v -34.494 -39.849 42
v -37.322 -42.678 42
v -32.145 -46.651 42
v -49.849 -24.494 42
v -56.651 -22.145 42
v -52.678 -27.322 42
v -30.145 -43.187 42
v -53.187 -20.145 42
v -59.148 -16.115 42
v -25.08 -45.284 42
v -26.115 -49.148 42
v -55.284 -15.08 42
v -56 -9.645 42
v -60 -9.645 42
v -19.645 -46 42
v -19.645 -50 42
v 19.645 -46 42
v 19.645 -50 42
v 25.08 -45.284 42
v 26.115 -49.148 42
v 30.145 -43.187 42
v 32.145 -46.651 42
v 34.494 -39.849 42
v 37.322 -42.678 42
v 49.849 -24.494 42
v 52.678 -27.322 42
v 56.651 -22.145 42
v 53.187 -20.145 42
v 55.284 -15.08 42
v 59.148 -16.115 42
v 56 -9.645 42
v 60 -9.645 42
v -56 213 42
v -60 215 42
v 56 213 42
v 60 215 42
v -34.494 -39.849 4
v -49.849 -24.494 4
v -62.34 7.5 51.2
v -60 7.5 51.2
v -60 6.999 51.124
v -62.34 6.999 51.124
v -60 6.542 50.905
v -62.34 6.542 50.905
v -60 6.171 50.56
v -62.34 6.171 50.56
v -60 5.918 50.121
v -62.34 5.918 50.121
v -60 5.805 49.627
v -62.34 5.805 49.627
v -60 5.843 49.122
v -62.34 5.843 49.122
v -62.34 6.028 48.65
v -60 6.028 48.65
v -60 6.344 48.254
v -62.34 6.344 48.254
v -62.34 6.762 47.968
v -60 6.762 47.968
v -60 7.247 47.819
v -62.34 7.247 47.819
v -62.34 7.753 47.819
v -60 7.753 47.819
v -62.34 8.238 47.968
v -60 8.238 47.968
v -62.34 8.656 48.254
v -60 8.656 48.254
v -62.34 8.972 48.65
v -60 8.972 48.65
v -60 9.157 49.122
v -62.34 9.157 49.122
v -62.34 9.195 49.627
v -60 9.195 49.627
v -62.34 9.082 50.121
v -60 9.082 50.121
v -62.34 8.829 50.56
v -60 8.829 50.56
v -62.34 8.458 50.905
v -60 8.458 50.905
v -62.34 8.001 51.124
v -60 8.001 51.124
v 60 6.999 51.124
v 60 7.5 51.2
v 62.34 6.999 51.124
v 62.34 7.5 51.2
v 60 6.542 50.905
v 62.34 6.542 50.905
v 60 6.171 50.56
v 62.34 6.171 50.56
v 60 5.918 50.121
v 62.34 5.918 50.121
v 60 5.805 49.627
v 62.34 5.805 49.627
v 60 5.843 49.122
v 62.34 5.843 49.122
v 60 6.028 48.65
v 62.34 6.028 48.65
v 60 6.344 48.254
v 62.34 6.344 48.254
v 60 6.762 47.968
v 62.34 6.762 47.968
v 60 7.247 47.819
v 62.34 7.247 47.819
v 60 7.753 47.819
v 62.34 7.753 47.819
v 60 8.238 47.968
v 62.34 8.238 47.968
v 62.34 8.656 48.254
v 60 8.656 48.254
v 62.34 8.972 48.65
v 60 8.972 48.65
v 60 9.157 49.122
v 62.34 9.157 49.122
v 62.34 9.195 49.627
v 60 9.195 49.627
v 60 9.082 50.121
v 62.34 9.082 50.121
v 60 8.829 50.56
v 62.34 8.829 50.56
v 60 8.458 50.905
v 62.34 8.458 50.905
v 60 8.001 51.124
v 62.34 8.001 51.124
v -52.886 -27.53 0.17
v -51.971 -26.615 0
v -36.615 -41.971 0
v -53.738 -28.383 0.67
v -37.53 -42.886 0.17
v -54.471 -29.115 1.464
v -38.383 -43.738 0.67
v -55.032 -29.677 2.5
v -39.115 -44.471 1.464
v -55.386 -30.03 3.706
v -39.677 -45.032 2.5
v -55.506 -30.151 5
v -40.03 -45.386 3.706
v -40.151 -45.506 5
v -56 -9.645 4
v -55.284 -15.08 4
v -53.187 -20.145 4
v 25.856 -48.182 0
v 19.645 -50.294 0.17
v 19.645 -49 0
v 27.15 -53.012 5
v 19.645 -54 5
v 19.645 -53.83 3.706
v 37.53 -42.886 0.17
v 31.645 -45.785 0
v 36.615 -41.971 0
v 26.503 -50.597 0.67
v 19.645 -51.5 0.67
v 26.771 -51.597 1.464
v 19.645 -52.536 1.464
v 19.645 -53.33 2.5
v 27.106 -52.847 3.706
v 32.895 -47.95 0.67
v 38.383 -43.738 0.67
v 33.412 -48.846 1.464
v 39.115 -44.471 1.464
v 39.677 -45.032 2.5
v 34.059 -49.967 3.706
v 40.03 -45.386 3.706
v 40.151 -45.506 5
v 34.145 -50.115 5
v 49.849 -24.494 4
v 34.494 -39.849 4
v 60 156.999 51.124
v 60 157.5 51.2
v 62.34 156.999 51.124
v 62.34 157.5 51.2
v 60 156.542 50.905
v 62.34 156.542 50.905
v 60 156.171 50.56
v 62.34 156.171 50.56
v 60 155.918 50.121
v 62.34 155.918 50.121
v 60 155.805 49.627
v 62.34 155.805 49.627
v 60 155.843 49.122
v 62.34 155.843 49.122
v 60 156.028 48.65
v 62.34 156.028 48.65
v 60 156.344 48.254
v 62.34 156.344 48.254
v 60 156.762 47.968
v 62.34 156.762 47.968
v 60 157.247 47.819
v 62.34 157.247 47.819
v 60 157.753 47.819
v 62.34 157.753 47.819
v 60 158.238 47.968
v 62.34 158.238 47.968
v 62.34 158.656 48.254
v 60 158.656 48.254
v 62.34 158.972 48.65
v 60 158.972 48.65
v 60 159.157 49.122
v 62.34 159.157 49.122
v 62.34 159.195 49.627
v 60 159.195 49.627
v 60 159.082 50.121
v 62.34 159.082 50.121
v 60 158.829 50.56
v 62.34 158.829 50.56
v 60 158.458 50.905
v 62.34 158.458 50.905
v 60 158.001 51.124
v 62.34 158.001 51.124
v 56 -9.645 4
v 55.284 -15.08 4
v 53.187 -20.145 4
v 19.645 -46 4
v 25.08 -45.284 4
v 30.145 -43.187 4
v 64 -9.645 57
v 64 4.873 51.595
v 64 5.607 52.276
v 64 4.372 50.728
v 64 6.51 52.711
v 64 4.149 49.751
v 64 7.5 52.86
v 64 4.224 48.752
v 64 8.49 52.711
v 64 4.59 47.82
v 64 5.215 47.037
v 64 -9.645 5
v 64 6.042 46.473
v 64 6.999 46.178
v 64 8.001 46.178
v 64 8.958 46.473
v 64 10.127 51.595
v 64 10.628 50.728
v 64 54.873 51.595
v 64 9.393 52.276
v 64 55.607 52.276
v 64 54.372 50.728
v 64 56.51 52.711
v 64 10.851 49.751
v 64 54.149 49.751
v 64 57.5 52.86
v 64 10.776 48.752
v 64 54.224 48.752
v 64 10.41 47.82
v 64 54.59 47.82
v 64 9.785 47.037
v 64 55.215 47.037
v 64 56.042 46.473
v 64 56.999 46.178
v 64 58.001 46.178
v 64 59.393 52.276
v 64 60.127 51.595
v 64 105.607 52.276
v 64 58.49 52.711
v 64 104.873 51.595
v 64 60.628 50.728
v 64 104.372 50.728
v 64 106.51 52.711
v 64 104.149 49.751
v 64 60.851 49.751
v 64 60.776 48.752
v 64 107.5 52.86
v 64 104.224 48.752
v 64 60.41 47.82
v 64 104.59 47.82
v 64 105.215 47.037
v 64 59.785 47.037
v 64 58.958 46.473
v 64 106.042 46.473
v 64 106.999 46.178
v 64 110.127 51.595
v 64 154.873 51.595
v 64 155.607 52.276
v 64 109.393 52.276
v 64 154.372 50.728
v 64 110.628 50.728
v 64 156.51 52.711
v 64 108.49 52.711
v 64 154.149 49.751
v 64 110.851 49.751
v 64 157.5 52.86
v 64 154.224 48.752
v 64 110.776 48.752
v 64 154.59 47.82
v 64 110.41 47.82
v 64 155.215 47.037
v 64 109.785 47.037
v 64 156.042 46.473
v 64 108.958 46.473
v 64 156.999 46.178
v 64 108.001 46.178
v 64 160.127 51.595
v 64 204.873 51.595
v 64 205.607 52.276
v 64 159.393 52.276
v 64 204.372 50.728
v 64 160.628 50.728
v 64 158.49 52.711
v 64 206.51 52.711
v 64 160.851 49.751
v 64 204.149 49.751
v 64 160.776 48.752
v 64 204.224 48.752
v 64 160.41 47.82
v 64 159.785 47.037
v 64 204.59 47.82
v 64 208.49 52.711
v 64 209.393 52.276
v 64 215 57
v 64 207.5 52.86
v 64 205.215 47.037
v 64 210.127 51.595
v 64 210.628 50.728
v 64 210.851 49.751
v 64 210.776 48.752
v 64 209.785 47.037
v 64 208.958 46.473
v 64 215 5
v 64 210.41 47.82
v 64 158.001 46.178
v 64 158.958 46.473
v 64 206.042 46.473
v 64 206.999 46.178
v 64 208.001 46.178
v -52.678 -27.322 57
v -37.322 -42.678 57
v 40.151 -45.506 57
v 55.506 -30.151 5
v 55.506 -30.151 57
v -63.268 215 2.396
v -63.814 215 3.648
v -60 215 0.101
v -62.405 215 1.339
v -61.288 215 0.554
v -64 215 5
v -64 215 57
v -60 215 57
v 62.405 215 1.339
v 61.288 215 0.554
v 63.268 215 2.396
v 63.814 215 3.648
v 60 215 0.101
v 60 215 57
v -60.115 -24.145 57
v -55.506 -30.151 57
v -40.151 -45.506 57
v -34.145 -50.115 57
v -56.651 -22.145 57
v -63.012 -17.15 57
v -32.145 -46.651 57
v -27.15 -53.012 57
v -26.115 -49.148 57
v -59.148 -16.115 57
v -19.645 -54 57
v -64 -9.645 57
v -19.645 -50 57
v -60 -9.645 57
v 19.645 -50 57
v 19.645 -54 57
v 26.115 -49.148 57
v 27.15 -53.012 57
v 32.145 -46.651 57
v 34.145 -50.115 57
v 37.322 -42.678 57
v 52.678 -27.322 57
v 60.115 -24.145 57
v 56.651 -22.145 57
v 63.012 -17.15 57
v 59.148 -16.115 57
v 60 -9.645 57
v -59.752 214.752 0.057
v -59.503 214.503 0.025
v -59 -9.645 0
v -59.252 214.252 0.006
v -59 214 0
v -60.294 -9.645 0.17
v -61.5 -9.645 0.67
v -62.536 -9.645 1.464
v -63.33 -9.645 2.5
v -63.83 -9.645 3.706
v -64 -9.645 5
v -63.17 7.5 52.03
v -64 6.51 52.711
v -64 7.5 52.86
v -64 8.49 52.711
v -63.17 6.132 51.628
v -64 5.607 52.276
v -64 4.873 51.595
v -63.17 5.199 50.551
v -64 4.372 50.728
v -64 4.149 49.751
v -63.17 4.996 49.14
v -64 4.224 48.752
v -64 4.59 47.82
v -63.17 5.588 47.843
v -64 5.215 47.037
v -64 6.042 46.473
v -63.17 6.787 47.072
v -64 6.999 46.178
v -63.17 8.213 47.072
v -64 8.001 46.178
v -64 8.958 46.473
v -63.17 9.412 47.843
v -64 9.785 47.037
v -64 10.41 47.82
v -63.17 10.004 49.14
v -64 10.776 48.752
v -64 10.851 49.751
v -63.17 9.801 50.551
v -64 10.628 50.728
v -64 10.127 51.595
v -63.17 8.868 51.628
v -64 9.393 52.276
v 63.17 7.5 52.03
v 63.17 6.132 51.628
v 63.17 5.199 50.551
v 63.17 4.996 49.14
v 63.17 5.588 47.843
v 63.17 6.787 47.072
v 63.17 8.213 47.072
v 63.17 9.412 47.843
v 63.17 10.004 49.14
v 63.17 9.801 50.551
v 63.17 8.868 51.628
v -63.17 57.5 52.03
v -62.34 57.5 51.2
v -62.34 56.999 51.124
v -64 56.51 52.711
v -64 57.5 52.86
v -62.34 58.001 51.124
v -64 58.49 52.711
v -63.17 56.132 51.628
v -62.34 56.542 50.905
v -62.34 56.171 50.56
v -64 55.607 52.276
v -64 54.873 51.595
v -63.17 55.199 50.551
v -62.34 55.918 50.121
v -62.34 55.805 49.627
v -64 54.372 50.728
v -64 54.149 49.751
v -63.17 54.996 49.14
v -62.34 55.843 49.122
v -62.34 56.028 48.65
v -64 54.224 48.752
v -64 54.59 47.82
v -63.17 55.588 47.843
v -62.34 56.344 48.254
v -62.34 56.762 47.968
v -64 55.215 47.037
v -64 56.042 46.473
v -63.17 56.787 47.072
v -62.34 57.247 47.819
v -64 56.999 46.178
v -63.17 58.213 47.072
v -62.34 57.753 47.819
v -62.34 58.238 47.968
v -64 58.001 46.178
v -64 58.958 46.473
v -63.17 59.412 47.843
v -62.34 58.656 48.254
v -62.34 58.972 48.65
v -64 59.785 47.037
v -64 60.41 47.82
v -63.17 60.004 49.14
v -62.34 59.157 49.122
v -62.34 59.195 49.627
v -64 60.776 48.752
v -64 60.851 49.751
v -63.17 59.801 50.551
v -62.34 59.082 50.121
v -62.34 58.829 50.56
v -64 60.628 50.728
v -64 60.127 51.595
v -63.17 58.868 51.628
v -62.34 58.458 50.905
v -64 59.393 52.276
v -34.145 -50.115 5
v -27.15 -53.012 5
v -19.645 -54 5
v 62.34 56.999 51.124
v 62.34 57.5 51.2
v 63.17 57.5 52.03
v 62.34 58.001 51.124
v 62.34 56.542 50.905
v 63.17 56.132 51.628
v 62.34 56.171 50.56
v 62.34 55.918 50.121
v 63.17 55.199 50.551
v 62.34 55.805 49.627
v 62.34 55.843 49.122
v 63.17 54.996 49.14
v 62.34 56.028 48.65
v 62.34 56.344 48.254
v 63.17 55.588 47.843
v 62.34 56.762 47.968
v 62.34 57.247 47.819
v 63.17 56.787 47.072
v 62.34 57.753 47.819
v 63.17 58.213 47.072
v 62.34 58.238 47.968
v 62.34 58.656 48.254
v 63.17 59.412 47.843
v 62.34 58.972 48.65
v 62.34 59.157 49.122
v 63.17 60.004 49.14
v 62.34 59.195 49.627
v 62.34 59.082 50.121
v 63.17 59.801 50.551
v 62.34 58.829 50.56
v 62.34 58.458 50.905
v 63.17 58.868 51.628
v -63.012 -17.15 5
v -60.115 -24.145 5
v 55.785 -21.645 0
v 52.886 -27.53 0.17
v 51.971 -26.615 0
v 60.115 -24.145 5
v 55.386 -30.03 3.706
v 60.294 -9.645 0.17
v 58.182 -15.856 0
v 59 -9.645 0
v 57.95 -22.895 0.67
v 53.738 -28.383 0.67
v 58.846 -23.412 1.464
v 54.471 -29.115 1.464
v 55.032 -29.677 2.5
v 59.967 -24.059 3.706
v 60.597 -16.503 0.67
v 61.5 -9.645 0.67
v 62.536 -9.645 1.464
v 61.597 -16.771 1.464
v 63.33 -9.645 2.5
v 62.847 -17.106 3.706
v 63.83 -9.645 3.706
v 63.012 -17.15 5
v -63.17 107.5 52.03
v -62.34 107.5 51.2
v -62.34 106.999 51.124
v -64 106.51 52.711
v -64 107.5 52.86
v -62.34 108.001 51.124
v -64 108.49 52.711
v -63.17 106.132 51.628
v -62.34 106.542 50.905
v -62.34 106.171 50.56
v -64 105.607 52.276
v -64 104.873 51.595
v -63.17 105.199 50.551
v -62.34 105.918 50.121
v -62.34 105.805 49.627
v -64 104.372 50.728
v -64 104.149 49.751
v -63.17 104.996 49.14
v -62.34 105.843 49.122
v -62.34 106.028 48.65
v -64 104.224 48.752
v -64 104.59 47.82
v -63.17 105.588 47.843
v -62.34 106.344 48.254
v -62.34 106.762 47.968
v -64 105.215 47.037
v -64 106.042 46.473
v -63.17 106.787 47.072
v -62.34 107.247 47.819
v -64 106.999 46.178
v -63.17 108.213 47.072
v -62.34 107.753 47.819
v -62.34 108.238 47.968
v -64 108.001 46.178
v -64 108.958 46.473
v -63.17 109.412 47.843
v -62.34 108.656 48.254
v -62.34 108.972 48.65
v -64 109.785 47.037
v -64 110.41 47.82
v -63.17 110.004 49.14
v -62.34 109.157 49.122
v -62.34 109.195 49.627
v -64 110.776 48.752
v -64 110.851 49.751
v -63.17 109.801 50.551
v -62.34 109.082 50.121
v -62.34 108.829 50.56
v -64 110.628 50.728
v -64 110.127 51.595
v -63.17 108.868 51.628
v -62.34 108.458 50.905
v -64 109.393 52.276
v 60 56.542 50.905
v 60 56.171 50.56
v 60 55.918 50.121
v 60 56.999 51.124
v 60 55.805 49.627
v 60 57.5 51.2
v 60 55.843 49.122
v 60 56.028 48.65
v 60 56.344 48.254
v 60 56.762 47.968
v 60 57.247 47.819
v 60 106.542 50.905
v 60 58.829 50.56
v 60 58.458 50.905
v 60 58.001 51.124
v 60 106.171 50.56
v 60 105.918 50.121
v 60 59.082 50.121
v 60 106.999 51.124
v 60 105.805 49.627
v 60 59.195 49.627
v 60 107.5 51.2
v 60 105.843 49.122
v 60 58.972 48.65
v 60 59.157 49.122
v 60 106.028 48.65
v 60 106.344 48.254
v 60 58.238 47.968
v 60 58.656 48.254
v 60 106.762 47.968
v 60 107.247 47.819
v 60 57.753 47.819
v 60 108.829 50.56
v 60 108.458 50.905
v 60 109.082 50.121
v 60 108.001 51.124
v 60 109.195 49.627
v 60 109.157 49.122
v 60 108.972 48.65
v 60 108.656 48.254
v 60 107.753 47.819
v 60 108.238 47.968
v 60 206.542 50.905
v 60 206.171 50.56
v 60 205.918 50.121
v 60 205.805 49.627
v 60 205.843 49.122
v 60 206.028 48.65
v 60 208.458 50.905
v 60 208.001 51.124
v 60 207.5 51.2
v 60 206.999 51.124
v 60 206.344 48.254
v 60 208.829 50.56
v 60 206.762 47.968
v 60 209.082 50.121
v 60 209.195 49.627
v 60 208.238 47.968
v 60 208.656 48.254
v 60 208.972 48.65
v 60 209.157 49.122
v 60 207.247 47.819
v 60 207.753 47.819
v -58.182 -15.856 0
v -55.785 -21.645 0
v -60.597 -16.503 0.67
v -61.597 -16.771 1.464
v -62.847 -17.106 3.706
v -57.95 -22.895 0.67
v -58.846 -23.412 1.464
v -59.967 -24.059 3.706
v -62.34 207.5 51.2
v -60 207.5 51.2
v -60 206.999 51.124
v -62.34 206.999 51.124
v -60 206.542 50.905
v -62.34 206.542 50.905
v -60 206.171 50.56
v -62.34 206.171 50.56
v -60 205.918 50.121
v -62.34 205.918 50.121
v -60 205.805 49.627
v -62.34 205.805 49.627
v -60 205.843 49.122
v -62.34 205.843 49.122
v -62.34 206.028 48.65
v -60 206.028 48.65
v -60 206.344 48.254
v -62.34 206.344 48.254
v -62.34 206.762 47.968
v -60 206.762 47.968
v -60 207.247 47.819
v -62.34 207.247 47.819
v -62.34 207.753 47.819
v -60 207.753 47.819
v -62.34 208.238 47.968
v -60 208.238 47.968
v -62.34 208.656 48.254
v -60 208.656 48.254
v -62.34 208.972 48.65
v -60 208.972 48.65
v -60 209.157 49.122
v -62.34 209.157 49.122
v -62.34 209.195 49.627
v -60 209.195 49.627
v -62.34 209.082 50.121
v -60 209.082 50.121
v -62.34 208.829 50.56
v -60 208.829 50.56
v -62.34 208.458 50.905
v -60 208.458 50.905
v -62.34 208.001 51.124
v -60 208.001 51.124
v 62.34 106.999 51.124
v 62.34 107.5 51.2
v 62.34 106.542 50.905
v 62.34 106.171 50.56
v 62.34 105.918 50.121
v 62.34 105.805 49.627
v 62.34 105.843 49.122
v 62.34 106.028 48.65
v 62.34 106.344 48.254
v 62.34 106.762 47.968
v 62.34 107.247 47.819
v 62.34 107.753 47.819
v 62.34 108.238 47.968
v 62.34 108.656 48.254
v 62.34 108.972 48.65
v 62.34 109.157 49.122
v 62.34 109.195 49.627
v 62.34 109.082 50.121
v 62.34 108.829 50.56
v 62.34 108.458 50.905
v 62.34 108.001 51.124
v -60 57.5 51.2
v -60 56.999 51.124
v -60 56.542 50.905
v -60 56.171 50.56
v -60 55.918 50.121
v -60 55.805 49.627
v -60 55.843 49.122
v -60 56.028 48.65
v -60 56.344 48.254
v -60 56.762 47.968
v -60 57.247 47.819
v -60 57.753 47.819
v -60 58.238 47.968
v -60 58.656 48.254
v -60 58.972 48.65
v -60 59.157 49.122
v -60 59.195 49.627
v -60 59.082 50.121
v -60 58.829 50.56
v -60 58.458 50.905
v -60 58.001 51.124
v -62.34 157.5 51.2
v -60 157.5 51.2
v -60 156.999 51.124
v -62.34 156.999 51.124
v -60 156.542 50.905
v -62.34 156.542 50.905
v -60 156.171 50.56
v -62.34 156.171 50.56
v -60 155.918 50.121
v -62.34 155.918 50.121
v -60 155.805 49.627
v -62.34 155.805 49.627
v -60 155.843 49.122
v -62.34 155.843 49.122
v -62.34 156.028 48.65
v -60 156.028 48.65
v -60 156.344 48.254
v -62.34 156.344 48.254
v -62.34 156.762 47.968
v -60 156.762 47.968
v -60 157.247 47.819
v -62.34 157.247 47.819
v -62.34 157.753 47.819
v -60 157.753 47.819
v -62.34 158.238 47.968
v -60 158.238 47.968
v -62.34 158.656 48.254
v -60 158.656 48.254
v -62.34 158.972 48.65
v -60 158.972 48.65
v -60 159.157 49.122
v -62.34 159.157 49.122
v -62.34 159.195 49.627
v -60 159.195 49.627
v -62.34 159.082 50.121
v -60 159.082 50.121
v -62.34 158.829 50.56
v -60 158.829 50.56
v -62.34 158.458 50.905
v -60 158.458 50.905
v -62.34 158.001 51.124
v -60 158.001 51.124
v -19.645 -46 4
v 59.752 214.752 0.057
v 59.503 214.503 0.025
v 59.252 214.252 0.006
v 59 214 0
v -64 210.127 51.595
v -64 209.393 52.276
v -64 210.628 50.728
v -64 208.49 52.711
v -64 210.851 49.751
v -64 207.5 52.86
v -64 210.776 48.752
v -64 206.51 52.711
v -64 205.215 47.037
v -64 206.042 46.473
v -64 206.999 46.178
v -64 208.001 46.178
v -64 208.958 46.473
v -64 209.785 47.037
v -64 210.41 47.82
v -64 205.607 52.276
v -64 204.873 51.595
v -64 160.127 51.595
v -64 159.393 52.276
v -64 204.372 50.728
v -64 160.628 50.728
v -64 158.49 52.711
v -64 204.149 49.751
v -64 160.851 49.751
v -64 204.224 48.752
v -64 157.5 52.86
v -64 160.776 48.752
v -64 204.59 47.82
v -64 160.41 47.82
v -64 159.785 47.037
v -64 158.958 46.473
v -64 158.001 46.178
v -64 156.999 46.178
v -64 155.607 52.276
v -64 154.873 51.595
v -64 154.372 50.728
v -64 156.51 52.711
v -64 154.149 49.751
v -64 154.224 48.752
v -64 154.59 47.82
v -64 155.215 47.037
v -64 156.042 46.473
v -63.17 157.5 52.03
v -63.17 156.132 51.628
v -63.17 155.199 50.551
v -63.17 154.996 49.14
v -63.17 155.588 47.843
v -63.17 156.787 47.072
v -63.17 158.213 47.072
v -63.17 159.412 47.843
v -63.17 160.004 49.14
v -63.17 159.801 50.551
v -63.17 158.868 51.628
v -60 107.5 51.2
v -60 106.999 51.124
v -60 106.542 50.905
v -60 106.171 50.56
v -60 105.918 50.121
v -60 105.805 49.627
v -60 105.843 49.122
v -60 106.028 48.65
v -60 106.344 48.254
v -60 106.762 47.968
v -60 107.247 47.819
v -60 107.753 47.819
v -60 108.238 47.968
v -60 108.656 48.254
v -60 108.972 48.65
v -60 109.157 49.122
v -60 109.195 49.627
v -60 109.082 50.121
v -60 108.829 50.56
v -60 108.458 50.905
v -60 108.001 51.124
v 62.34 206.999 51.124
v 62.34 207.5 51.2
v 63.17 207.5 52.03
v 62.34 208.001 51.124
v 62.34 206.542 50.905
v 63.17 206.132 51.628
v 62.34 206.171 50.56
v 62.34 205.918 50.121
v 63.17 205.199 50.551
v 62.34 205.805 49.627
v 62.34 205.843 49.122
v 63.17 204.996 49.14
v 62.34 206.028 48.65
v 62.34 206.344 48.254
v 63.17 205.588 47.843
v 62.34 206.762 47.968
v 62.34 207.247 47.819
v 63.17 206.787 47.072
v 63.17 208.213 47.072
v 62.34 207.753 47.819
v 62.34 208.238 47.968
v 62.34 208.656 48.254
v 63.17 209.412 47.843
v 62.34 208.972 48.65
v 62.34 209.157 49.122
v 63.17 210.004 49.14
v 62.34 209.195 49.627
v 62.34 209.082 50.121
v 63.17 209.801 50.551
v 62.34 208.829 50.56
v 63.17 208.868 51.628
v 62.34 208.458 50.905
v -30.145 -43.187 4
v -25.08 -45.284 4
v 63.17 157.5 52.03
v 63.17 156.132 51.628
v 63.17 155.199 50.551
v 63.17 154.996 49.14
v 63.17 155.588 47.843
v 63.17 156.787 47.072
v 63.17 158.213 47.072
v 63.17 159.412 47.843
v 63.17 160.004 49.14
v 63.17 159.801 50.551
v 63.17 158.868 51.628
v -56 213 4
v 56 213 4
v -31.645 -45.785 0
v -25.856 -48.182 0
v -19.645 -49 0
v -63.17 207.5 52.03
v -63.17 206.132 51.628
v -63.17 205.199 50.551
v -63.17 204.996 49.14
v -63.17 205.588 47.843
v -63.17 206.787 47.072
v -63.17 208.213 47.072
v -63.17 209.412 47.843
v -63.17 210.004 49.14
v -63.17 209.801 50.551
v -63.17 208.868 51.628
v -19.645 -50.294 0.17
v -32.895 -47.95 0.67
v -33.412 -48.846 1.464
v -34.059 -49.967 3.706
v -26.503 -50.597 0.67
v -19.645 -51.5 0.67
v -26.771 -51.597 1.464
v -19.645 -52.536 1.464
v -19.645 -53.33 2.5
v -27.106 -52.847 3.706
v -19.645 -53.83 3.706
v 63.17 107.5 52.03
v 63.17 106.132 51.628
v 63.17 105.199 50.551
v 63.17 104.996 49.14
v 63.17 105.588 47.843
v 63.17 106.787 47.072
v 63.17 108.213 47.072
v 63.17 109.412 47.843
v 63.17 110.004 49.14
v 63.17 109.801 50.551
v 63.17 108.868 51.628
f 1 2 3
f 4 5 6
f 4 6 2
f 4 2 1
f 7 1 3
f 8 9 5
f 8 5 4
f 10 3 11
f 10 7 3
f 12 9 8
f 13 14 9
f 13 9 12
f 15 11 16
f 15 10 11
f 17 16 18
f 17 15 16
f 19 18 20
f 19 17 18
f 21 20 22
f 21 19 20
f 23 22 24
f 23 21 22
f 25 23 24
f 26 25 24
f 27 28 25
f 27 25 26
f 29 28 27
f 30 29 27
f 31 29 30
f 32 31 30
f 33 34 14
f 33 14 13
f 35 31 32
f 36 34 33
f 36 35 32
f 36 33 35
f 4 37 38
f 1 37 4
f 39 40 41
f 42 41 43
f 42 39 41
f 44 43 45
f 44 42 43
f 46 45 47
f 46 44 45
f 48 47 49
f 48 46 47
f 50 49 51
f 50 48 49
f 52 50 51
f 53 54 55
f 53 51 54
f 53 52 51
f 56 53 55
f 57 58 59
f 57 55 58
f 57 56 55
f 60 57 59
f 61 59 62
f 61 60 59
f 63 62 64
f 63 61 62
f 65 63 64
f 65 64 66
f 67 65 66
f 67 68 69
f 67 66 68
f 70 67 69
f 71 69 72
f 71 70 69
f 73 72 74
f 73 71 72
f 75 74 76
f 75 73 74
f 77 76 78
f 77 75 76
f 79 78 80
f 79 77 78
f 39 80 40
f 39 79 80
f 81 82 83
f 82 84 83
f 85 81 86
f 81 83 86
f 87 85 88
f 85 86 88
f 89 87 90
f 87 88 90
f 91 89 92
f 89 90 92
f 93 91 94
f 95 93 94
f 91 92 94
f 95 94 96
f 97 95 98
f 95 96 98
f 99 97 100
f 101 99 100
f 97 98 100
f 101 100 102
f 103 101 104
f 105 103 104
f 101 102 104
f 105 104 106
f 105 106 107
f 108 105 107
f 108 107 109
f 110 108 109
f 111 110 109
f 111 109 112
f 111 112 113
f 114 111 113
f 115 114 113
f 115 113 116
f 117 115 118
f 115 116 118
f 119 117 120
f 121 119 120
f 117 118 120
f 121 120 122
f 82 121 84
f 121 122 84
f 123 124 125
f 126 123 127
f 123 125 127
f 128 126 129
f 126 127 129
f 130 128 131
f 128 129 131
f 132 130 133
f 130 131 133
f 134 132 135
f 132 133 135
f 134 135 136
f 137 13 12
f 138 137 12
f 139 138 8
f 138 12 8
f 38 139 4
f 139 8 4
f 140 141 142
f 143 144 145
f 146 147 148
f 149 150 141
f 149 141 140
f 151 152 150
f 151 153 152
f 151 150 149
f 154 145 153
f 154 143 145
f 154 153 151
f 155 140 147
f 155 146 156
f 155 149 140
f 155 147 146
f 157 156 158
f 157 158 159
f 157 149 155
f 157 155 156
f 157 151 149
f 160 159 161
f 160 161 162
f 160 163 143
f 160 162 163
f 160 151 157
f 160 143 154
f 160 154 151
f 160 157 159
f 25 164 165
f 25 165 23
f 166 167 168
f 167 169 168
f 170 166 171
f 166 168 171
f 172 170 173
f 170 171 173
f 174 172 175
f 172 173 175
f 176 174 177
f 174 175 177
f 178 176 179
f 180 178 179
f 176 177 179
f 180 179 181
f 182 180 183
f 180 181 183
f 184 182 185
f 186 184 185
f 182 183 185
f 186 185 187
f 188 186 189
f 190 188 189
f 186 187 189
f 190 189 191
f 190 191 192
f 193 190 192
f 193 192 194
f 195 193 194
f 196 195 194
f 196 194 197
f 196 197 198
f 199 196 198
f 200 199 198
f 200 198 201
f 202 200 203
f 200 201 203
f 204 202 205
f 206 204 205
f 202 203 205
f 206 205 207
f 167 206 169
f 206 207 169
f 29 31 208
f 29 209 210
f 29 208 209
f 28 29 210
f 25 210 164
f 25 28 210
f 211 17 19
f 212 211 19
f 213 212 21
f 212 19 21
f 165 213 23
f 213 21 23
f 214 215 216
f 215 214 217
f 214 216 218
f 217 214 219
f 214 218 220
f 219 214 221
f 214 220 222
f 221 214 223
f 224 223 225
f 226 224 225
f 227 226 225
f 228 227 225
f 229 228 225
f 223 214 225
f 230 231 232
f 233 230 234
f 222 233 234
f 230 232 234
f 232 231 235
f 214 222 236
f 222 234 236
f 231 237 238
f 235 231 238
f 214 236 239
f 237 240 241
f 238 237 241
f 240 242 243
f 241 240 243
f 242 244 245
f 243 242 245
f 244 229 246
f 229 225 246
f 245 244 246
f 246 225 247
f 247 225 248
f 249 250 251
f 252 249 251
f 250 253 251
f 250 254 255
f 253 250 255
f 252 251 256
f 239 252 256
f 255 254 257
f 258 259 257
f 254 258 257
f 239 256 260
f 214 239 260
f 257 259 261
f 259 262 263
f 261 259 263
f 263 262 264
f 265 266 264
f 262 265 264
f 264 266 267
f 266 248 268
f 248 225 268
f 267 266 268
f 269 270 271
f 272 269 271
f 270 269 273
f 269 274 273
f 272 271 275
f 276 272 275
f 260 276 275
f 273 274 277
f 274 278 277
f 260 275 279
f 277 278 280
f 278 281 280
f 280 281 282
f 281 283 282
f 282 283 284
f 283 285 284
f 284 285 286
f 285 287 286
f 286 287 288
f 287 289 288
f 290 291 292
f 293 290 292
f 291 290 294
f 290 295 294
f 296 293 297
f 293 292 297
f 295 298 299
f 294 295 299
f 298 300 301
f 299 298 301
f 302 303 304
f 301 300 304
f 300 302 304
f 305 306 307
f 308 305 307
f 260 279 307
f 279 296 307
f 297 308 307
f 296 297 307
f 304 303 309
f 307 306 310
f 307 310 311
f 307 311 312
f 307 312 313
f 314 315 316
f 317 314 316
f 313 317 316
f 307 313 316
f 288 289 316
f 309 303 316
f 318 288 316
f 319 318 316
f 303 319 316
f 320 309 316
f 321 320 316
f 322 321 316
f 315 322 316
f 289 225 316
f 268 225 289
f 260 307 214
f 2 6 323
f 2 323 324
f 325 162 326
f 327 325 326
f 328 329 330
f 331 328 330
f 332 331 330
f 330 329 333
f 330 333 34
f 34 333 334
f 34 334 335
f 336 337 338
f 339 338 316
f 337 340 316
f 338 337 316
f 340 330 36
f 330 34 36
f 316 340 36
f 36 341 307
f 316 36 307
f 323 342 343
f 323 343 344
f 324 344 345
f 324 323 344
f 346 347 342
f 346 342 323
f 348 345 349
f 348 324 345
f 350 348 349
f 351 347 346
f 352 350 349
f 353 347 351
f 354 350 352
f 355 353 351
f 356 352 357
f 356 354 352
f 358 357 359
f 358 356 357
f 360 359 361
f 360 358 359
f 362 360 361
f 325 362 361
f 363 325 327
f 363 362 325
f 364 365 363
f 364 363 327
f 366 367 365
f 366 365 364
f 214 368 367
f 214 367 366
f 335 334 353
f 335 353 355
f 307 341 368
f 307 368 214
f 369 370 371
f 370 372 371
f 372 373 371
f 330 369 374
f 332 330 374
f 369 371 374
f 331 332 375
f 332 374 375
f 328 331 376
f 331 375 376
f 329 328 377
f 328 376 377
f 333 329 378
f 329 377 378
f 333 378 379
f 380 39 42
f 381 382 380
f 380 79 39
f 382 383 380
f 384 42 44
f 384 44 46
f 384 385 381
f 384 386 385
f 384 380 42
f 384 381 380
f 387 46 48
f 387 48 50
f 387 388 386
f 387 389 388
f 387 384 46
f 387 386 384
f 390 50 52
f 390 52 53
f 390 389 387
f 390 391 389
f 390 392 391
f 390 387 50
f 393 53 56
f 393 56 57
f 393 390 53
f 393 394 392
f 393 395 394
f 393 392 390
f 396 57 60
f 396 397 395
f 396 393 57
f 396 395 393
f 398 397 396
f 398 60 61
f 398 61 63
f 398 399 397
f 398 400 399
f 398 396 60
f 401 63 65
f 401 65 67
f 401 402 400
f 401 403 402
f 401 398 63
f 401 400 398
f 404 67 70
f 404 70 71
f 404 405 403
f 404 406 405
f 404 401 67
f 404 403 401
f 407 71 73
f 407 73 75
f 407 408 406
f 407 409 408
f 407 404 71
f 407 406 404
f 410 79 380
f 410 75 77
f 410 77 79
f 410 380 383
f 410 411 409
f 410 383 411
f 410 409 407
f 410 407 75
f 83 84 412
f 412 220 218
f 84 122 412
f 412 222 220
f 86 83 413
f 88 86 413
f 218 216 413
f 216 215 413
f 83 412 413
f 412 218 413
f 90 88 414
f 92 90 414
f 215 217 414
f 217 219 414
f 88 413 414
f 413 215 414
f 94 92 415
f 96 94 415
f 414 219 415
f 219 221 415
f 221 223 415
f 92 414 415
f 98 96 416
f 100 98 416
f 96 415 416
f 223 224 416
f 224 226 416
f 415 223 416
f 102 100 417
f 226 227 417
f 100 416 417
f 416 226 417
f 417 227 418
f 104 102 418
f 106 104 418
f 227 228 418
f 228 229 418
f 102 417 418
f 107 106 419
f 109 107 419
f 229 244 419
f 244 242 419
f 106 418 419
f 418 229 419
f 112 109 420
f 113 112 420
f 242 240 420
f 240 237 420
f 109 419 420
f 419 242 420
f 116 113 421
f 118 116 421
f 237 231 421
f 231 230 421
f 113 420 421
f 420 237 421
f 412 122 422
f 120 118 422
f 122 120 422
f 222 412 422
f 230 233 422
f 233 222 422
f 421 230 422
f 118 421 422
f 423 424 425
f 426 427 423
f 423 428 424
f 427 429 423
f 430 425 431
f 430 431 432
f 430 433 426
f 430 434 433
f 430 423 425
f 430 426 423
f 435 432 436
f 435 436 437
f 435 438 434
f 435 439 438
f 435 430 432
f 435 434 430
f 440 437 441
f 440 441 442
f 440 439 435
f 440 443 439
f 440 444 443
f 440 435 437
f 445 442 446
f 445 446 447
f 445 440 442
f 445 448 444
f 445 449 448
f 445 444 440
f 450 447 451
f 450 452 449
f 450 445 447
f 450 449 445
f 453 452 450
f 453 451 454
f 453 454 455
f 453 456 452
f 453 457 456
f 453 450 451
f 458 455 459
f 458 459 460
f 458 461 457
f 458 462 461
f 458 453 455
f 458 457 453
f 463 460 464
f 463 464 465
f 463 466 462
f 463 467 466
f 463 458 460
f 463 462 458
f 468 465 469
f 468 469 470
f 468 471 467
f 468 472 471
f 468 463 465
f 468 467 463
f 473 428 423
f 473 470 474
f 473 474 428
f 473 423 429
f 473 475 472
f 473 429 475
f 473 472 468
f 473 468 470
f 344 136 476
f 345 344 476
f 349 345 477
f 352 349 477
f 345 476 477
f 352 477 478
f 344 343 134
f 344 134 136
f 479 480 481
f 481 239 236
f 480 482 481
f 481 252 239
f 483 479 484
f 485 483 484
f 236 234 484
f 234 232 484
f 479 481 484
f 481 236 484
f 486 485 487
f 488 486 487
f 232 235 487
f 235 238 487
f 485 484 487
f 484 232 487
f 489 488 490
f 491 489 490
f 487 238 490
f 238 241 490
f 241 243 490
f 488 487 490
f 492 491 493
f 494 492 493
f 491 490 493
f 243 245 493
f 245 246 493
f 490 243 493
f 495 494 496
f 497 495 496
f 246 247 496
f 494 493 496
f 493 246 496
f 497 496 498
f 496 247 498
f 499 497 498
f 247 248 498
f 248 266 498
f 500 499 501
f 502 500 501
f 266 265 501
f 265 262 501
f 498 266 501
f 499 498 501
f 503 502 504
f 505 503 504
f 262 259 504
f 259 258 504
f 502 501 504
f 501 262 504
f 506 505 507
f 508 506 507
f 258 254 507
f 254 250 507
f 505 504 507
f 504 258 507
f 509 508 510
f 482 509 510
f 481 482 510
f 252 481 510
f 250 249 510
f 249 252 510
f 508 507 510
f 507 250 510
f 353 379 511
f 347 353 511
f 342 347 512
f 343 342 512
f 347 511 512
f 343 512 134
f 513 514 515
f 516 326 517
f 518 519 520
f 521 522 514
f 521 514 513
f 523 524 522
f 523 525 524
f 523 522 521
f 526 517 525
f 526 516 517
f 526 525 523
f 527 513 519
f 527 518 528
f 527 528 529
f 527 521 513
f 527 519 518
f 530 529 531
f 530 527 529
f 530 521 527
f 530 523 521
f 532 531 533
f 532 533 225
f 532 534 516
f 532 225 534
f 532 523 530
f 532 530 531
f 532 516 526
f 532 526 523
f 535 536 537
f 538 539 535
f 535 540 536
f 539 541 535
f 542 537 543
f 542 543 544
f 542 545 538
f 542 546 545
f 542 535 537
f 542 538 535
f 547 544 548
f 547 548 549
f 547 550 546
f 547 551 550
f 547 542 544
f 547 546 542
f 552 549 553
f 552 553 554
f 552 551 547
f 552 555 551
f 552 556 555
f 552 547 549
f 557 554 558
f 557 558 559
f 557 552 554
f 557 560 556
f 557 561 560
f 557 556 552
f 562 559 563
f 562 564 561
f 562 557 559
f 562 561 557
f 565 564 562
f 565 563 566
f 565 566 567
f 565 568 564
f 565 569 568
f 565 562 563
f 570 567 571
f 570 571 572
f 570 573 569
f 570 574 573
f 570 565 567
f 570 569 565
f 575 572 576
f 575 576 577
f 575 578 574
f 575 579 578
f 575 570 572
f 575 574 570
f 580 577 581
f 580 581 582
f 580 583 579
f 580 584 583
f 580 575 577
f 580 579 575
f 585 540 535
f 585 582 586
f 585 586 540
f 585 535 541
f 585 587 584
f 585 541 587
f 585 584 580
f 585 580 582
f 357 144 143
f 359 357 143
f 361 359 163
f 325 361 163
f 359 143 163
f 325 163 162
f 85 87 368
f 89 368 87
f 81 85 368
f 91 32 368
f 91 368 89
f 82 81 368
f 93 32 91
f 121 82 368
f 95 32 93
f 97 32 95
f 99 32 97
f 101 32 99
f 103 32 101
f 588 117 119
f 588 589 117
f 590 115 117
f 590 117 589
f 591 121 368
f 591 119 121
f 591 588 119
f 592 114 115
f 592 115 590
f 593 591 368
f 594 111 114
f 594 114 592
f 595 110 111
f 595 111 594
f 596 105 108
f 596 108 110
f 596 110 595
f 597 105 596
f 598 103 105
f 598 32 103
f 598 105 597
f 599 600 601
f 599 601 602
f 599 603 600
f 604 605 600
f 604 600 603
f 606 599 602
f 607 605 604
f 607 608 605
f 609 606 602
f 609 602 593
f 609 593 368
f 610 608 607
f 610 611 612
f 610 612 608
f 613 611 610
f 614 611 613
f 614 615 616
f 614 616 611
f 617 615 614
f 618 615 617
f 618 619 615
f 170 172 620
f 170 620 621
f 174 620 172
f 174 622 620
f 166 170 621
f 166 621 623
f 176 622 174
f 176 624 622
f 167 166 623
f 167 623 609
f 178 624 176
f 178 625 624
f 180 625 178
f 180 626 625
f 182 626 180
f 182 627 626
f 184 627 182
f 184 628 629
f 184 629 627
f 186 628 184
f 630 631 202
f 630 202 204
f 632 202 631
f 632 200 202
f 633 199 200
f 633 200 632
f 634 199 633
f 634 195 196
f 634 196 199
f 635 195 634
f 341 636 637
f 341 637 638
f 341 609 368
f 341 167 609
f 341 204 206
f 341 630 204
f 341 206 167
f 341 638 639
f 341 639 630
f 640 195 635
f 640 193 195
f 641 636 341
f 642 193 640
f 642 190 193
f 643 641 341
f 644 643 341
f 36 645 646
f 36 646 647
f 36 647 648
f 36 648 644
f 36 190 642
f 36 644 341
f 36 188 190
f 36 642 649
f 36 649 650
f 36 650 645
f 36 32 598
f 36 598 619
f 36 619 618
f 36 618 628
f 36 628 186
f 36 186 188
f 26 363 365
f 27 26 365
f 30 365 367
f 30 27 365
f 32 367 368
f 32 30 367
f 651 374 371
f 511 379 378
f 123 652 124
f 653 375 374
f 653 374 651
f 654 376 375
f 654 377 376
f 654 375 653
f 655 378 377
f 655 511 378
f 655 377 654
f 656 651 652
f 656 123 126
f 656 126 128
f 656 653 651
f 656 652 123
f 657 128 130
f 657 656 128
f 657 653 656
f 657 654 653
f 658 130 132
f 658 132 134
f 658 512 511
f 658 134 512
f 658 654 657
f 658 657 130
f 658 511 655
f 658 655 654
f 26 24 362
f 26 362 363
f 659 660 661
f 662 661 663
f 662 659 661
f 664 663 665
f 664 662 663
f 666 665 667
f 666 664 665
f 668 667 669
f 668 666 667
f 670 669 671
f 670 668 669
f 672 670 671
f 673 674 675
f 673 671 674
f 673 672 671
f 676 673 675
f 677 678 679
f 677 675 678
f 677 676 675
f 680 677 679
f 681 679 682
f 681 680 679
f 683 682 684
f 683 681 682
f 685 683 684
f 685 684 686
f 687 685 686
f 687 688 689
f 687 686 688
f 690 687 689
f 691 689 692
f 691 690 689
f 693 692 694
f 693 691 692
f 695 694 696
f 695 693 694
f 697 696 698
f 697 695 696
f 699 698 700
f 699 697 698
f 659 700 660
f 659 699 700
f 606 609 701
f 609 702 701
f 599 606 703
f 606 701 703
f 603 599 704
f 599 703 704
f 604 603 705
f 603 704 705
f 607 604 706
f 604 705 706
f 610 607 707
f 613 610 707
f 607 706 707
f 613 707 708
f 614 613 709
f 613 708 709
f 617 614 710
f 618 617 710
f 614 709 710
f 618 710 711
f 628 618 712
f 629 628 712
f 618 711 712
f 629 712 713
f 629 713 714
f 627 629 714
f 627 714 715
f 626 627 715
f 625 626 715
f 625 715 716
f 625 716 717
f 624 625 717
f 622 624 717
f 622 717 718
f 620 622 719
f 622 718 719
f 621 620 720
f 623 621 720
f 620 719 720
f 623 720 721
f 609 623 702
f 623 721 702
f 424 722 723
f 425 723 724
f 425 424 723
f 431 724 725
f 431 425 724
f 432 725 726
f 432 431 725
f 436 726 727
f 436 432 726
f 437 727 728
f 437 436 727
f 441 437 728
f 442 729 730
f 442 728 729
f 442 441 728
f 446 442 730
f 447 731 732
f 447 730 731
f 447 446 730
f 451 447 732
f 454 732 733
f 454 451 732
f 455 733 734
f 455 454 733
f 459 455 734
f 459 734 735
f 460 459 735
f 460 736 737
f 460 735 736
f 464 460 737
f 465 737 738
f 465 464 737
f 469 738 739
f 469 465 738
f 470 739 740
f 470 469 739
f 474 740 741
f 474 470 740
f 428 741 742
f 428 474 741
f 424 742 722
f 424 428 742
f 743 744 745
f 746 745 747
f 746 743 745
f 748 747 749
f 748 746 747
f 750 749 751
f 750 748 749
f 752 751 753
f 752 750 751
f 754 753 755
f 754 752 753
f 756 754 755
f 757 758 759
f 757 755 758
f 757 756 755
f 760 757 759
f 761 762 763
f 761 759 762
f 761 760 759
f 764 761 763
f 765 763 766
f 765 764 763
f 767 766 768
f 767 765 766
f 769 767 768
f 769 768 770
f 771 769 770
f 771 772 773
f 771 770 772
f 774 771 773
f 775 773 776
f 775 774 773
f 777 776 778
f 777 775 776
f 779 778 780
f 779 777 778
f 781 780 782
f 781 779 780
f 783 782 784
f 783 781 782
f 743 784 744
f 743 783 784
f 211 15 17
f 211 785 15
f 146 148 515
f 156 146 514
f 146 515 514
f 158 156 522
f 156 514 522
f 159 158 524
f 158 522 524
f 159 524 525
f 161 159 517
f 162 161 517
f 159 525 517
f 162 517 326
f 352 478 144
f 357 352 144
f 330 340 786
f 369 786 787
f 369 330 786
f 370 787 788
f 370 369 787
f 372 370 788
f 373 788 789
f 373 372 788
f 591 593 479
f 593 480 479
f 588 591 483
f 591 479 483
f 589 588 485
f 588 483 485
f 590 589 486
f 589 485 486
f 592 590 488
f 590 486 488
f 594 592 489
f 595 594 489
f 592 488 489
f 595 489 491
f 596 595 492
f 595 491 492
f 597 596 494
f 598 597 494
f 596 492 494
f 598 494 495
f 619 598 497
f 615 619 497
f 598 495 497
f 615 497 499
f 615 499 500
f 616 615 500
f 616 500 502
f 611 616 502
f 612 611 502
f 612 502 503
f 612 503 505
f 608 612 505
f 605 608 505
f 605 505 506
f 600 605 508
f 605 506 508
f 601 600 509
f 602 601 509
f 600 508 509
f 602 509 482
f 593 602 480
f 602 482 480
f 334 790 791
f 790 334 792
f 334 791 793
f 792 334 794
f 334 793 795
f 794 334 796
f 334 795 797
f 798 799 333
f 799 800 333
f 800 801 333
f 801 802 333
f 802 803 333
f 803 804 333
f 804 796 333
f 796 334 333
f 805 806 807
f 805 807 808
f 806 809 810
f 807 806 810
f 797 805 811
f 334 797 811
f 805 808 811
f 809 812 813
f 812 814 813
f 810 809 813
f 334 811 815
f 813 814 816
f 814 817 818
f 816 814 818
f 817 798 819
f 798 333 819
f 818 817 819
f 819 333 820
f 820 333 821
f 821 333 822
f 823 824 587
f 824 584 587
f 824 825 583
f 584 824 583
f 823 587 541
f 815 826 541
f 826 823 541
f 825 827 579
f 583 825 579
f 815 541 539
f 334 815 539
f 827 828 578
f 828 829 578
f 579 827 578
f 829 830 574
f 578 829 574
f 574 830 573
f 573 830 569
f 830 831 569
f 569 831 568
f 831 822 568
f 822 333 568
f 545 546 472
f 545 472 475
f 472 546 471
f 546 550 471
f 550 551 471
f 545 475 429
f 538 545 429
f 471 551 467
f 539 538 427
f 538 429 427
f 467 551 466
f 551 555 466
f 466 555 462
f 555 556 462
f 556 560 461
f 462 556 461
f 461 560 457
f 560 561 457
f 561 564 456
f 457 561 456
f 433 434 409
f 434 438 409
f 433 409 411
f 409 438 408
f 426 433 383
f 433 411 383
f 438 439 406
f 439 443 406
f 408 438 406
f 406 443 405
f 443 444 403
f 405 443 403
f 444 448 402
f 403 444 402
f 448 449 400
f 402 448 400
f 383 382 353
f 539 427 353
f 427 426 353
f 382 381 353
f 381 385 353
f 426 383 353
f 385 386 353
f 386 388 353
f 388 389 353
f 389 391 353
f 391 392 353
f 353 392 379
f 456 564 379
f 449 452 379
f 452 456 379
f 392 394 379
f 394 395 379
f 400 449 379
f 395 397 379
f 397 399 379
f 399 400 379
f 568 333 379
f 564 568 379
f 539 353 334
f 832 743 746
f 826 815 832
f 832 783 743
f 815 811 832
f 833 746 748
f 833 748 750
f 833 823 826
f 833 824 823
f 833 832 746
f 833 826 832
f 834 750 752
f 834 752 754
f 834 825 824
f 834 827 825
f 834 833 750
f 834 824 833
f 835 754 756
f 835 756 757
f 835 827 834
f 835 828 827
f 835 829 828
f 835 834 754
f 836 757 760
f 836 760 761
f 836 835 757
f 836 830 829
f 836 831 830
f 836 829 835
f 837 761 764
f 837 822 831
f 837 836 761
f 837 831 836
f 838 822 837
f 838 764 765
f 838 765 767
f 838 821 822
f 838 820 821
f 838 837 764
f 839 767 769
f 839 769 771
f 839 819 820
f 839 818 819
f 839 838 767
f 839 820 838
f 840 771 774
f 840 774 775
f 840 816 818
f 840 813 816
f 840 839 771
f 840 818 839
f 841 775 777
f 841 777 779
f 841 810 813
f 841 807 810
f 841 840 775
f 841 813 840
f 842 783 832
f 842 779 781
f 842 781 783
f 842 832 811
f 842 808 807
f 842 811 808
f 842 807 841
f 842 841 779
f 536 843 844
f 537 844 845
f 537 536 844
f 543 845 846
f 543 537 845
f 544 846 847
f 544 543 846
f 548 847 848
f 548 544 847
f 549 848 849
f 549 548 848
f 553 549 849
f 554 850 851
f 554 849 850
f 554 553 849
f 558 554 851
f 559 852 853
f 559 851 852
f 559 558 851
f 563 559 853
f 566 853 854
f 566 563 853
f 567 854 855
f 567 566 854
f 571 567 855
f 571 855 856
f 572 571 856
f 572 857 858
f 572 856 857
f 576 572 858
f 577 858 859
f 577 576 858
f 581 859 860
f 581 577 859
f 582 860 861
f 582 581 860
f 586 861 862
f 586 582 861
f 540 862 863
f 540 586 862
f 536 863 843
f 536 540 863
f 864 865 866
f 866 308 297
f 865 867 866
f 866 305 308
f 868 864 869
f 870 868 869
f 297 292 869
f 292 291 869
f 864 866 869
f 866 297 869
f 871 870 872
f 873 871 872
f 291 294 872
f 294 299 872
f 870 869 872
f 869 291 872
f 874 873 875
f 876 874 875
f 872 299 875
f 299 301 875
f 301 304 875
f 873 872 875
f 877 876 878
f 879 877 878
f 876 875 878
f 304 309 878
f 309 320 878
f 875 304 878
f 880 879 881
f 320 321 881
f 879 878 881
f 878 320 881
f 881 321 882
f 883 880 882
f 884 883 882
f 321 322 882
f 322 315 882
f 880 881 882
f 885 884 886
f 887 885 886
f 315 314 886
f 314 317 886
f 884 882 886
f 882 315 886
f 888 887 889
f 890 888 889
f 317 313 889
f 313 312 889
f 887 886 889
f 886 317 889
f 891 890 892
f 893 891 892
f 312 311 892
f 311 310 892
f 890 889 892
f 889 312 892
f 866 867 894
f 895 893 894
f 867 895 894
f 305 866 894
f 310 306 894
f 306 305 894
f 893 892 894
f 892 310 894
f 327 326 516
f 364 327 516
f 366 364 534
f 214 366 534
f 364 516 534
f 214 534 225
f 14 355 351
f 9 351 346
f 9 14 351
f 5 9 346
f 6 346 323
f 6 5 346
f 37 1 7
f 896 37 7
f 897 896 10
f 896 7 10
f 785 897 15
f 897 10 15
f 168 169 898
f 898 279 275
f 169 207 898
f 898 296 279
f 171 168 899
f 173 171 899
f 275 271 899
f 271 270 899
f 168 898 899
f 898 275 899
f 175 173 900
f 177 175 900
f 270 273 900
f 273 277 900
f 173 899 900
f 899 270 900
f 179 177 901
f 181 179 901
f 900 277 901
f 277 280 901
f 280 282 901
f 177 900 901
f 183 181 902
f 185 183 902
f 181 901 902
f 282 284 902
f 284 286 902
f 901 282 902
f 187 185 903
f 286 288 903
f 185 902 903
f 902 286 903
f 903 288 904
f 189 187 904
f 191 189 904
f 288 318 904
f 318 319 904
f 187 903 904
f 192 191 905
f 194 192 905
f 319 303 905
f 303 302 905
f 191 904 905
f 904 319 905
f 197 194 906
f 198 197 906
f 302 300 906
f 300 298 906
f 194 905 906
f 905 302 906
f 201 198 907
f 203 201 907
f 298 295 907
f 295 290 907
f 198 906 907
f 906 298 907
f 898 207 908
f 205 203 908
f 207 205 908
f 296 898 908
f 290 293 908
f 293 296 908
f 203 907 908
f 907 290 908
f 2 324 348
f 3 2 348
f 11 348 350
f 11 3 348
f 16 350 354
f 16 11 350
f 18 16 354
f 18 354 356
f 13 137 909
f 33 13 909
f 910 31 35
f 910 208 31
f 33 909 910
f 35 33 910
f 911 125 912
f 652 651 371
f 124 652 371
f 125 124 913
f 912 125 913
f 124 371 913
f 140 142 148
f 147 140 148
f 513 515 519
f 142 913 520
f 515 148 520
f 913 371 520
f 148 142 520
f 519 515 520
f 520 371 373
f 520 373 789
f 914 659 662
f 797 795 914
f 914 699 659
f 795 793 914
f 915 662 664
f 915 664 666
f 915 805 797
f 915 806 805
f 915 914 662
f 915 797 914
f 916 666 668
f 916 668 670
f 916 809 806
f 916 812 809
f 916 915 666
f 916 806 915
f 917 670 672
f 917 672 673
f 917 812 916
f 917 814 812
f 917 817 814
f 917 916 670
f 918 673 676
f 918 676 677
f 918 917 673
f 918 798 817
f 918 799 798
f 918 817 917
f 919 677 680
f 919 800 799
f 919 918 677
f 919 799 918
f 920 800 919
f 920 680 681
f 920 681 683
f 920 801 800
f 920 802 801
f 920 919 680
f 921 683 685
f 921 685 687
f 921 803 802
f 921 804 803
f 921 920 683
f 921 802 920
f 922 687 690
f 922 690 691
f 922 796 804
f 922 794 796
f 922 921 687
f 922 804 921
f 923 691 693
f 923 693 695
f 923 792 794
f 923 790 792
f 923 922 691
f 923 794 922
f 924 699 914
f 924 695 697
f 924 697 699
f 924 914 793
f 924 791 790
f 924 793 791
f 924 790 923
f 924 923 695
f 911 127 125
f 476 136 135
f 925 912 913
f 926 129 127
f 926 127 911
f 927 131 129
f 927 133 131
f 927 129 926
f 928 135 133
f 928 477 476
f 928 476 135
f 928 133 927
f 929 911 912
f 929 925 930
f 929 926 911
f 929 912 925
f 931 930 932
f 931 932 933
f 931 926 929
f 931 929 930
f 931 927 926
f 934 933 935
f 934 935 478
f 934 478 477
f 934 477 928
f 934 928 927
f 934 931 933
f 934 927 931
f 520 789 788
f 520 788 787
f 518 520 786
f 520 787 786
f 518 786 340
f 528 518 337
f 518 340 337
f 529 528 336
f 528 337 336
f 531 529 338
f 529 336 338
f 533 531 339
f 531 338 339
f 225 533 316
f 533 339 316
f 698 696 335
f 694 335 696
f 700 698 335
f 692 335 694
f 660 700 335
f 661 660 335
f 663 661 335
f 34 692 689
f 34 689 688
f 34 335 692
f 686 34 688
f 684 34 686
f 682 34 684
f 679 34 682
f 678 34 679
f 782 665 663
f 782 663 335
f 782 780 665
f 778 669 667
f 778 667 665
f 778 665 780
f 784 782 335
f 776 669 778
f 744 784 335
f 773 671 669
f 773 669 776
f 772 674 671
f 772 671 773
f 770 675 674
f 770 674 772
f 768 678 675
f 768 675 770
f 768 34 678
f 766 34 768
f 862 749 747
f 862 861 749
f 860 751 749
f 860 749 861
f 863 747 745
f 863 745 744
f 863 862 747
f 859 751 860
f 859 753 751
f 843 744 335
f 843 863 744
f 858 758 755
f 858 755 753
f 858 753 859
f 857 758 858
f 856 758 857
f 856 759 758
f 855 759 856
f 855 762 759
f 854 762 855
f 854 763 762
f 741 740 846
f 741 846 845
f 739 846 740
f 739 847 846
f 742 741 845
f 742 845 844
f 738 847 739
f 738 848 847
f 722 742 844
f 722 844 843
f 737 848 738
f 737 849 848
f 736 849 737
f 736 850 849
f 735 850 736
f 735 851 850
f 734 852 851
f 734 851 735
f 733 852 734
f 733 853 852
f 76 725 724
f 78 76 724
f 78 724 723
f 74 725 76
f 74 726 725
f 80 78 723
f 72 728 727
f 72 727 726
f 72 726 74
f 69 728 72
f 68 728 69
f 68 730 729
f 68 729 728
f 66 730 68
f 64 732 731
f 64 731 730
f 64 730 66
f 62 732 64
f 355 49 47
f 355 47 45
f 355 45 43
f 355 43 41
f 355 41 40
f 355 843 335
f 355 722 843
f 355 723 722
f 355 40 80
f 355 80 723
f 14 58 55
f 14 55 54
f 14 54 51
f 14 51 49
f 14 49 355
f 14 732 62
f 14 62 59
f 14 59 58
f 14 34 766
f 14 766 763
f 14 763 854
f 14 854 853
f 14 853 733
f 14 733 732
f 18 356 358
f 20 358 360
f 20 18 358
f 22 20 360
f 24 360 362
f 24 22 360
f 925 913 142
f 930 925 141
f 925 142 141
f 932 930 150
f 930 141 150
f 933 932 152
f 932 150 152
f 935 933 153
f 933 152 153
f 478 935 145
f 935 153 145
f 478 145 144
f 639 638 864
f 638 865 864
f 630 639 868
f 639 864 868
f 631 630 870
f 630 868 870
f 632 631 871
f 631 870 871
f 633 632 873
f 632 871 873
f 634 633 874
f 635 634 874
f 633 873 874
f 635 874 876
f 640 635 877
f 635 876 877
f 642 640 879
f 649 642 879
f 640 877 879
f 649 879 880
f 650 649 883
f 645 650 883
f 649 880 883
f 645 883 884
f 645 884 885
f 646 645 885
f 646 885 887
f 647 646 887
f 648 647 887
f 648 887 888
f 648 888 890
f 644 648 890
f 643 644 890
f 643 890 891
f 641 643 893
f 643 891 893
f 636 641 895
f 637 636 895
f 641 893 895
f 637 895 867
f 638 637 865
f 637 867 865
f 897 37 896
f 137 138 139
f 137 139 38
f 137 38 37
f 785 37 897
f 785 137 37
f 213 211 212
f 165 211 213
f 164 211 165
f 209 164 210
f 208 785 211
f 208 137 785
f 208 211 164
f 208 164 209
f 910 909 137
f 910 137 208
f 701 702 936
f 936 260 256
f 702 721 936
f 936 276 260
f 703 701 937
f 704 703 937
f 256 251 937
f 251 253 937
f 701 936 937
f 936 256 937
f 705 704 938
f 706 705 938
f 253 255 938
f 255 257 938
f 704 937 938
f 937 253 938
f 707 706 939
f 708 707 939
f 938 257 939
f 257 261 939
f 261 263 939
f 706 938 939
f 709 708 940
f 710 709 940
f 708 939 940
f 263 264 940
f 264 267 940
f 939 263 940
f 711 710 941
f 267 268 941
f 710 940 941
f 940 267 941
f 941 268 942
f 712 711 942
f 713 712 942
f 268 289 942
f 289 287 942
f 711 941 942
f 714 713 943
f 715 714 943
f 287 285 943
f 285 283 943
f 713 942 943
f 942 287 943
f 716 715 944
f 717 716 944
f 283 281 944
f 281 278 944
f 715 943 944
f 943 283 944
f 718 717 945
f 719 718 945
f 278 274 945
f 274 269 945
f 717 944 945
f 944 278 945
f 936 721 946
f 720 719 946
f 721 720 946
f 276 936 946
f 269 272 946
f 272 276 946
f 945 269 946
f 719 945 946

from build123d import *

# Parameters (mm, degrees)
SKETCH1_W                    = 120
SKETCH1_H                    = 265
BOSS_EXTRUDE1_DEPTH          = 42
CHAMFER1_SIZE                = 30
FILLET3_R                    = 25
SHELL1_T                     = -4
FILLET4_R                    = 5
BOSS_EXTRUDE2_DEPTH          = 15
BOSS_EXTRUDE2_DEPTH_BACK     = 42
FILLET7_R                    = 5
SKETCH4_W                    = 128
SKETCH4_H                    = 4
CUT_EXTRUDE1_DEPTH           = 236.172277278
CSK_FOR_M3_SFHCS1_AT_2_COUNT = 2
CSK_FOR_M3_SFHCS1_AT_2_PITCH = 50
CSK_FOR_M3_SFHCS1_AT_3_COUNT = 2
CSK_FOR_M3_SFHCS1_AT_3_PITCH = 100
CSK_FOR_M3_SFHCS1_AT_4_COUNT = 2
CSK_FOR_M3_SFHCS1_AT_4_PITCH = 150
CSK_FOR_M3_SFHCS1_AT_5_COUNT = 2
CSK_FOR_M3_SFHCS1_AT_5_PITCH = 200
SKETCH7_W                    = 112
SKETCH7_H                    = 20.766378669
CUT_EXTRUDE2_DEPTH           = 231.4994577


with BuildPart() as part:
    # Sketch1 → Boss-Extrude1 (new body)
    with BuildSketch(Plane.XY):
        with Locations((0, 82.5)):
            Rectangle(SKETCH1_W, SKETCH1_H)
    extrude(amount=BOSS_EXTRUDE1_DEPTH)

    # Chamfer1
    chamfer1_edges = [part.edges().sort_by_distance(p)[0] for p in [
        (60, -50, 21),
        (-60, -50, 21),
    ]]
    chamfer(chamfer1_edges, length=CHAMFER1_SIZE)

    # Fillet3
    fillet3_edges = [part.edges().sort_by_distance(p)[0] for p in [
        (30, -50, 21),
        (-30, -50, 21),
        (-60, -20, 21),
        (60, -20, 21),
    ]]
    fillet(fillet3_edges, radius=FILLET3_R)

    # Shell1
    shell1_openings = [part.faces().sort_by_distance(p)[0] for p in [
        (0, 86.277211475, 42),
    ]]
    offset(amount=SHELL1_T, openings=shell1_openings, kind=Kind.INTERSECTION)

    # Fillet4
    fillet4_edges = [part.edges().sort_by_distance(p)[0] for p in [
        (-56, 211, 23),
        (56, 211, 23),
    ]]
    fillet(fillet4_edges, radius=FILLET4_R)

    # Sketch2 → Boss-Extrude2 (add, two sides: drawn at the far end of the back side and taken through both)
    with BuildSketch(Plane.XY.offset(42).offset(-BOSS_EXTRUDE2_DEPTH_BACK)):
        with BuildLine():
            Line((-64, 219), (-64, -9.644660941))
            ThreePointArc((-64, -9.644660941), (-61.792506443, -20.742480479), (-55.506096654, -30.150757595))
            Line((-55.506096654, -30.150757595), (-40.150757595, -45.506096654))
            ThreePointArc((-40.150757595, -45.506096654), (-30.742480479, -51.792506443), (-19.644660941, -54))
            Line((-19.644660941, -54), (19.644660941, -54))
            ThreePointArc((19.644660941, -54), (30.742480479, -51.792506443), (40.150757595, -45.506096654))
            Line((40.150757595, -45.506096654), (55.506096654, -30.150757595))
            ThreePointArc((55.506096654, -30.150757595), (61.792506443, -20.742480479), (64, -9.644660941))
            Line((64, -9.644660941), (64, 219))
            Line((64, 219), (-64, 219))
        make_face()
        with BuildLine():
            Line((-60, 215), (-60, -9.644660941))
            ThreePointArc((-60, -9.644660941), (-58.096988313, -19.21174675), (-52.67766953, -27.32233047))
            Line((-52.67766953, -27.32233047), (-37.32233047, -42.67766953))
            ThreePointArc((-37.32233047, -42.67766953), (-29.21174675, -48.096988313), (-19.644660941, -50))
            Line((-19.644660941, -50), (19.644660941, -50))
            ThreePointArc((19.644660941, -50), (29.21174675, -48.096988313), (37.32233047, -42.67766953))
            Line((37.32233047, -42.67766953), (52.67766953, -27.32233047))
            ThreePointArc((52.67766953, -27.32233047), (58.096988313, -19.21174675), (60, -9.644660941))
            Line((60, -9.644660941), (60, 215))
            Line((60, 215), (-60, 215))
        make_face(mode=Mode.SUBTRACT)
    extrude(amount=BOSS_EXTRUDE2_DEPTH + BOSS_EXTRUDE2_DEPTH_BACK)

    # Fillet7
    fillet7_edges = [part.edges().sort_by_distance(p)[0] for p in [
        (0, 219, 0),
        (64, 104.67766953, 0),
        (61.792506443, -20.742480479, 0),
        (47.828427125, -37.828427125, 0),
        (30.742480479, -51.792506443, 0),
        (0, -54, 0),
        (-30.742480479, -51.792506443, 0),
        (-47.828427125, -37.828427125, 0),
        (-61.792506443, -20.742480479, 0),
        (-64, 104.67766953, 0),
    ]]
    fillet(fillet7_edges, radius=FILLET7_R)

    # Sketch4 → Cut-Extrude1 (cut, through all)
    with BuildSketch(Plane.XY.offset(57)):
        with Locations((0, 217)):
            Rectangle(SKETCH4_W, SKETCH4_H)
    extrude(amount=-CUT_EXTRUDE1_DEPTH, mode=Mode.SUBTRACT)

    # Sketch6 → CSK for M3 SFHCS1 (revolve, cut)
    with BuildSketch(Plane(origin=(-64, 7.5, 49.5), x_dir=(0, 0, 1), z_dir=(0, 1, 0))):
        Polygon((0, 0), (0, 16.021463052), (1.7, 15), (1.7, 1.66), (3.36, 0), align=None)
    csk_for_m3_sfhcs1 = revolve(axis=Axis((-70.35, 7.5, 49.5), (1, 0, 0)), mode=Mode.SUBTRACT)

    # CSK for M3 SFHCS1 at 2: CSK for M3 SFHCS1 ×2
    with Locations(*[(0, i * CSK_FOR_M3_SFHCS1_AT_2_PITCH, 0) for i in range(1, CSK_FOR_M3_SFHCS1_AT_2_COUNT)]):
        add(csk_for_m3_sfhcs1, mode=Mode.SUBTRACT)

    # CSK for M3 SFHCS1 at 3: CSK for M3 SFHCS1 ×2
    with Locations(*[(0, i * CSK_FOR_M3_SFHCS1_AT_3_PITCH, 0) for i in range(1, CSK_FOR_M3_SFHCS1_AT_3_COUNT)]):
        add(csk_for_m3_sfhcs1, mode=Mode.SUBTRACT)

    # CSK for M3 SFHCS1 at 4: CSK for M3 SFHCS1 ×2
    with Locations(*[(0, i * CSK_FOR_M3_SFHCS1_AT_4_PITCH, 0) for i in range(1, CSK_FOR_M3_SFHCS1_AT_4_COUNT)]):
        add(csk_for_m3_sfhcs1, mode=Mode.SUBTRACT)

    # CSK for M3 SFHCS1 at 5: CSK for M3 SFHCS1 ×2
    with Locations(*[(0, i * CSK_FOR_M3_SFHCS1_AT_5_PITCH, 0) for i in range(1, CSK_FOR_M3_SFHCS1_AT_5_COUNT)]):
        add(csk_for_m3_sfhcs1, mode=Mode.SUBTRACT)

    # Mirror1: CSK for M3 SFHCS1 across plane
    add(csk_for_m3_sfhcs1.mirror(Plane(origin=(0, 0, 0), x_dir=(0, 0, 1), z_dir=(1, 0, 0))), mode=Mode.SUBTRACT)

    # Mirror1 copy 1 sketch → Mirror1 copy 1 (revolve, cut)
    with BuildSketch(Plane(origin=(64, 57.5, 49.5), x_dir=(0, 0, 1), z_dir=(0, 1, 0))):
        Polygon((0, 0), (0, -16.021463052), (1.7, -15), (1.7, -1.66), (3.36, 0), align=None)
    revolve(axis=Axis((70.35, 57.5, 49.5), (1, 0, 0)), mode=Mode.SUBTRACT)

    # Mirror1 copy 2 sketch → Mirror1 copy 2 (revolve, cut)
    with BuildSketch(Plane(origin=(64, 107.5, 49.5), x_dir=(0, 0, 1), z_dir=(0, 1, 0))):
        Polygon((0, 0), (0, -16.021463052), (1.7, -15), (1.7, -1.66), (3.36, 0), align=None)
    revolve(axis=Axis((70.35, 107.5, 49.5), (1, 0, 0)), mode=Mode.SUBTRACT)

    # Mirror1 copy 3 sketch → Mirror1 copy 3 (revolve, cut)
    with BuildSketch(Plane(origin=(64, 157.5, 49.5), x_dir=(0, 0, 1), z_dir=(0, 1, 0))):
        Polygon((0, 0), (0, -16.021463052), (1.7, -15), (1.7, -1.66), (3.36, 0), align=None)
    revolve(axis=Axis((70.35, 157.5, 49.5), (1, 0, 0)), mode=Mode.SUBTRACT)

    # Mirror1 copy 4 sketch → Mirror1 copy 4 (revolve, cut)
    with BuildSketch(Plane(origin=(64, 207.5, 49.5), x_dir=(0, 0, 1), z_dir=(0, 1, 0))):
        Polygon((0, 0), (0, -16.021463052), (1.7, -15), (1.7, -1.66), (3.36, 0), align=None)
    revolve(axis=Axis((70.35, 207.5, 49.5), (1, 0, 0)), mode=Mode.SUBTRACT)

    # Sketch7 → Cut-Extrude2 (cut, through all)
    with BuildSketch(Plane.XY.offset(4)):
        with Locations((0, 202.616810665)):
            Rectangle(SKETCH7_W, SKETCH7_H)
    extrude(amount=CUT_EXTRUDE2_DEPTH, mode=Mode.SUBTRACT)


solid = part.part
